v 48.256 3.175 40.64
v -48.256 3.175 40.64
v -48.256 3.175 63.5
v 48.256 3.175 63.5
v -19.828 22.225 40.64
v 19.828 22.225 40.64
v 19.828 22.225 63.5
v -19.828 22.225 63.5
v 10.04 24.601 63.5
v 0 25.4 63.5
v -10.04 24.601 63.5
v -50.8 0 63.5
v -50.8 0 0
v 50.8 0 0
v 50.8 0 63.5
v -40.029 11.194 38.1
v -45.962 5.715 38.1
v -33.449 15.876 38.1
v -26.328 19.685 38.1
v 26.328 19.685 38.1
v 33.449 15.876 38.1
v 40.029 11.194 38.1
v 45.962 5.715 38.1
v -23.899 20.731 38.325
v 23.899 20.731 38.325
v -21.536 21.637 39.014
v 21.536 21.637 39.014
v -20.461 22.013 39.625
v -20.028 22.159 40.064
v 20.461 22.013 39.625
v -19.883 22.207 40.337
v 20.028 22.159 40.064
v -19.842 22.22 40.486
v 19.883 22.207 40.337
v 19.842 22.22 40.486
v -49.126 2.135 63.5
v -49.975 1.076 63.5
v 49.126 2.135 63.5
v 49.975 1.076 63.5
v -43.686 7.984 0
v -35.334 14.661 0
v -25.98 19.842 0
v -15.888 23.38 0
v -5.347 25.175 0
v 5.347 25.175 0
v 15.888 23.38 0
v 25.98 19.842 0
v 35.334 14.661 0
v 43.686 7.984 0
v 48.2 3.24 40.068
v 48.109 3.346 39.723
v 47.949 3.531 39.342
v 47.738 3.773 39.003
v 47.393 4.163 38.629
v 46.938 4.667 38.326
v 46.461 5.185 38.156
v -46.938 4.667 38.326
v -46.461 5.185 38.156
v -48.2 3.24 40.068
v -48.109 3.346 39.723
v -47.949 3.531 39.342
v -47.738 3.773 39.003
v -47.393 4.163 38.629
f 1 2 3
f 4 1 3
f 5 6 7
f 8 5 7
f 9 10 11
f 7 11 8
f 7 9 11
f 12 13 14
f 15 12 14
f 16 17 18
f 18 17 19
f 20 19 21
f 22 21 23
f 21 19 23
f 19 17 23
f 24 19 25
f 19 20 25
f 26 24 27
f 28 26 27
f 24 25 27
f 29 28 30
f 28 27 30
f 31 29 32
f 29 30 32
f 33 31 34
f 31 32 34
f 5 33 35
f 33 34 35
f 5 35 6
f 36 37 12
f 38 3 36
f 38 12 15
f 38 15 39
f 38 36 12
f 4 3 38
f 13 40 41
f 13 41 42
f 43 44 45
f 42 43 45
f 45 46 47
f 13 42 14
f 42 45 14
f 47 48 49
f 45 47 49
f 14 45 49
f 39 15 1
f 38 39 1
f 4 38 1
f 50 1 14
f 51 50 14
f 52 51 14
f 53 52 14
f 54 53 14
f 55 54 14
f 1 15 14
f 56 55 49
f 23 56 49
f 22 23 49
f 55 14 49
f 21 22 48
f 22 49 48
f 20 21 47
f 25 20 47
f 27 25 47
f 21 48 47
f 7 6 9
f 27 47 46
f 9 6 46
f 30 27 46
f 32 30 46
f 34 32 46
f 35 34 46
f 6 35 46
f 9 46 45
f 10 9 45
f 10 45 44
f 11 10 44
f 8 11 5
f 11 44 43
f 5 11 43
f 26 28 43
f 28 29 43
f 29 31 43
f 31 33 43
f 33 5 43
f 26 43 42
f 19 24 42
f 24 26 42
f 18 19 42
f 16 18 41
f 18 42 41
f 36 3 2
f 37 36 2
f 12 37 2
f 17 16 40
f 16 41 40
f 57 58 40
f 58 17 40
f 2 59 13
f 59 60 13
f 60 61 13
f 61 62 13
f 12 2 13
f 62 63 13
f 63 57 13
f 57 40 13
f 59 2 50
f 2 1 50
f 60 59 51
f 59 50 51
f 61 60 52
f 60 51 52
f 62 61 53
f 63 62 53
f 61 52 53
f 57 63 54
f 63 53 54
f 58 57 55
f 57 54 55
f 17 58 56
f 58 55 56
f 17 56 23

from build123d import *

# Parameters (mm, degrees)
F1_DEPTH = 63.5
F2_W     = 19.05
F2_H     = 25.4
F3_DEPTH = 50.8
F4_R     = 2.54


with BuildPart() as f1:
    # F0 (on Top) → F1 (new body)
    with BuildSketch(Plane.XY):
        with BuildLine():
            Line((-50.8, 0), (50.8, 0))
            ThreePointArc((50.8, 0), (0, 25.4), (-50.8, 0))
        make_face()
    extrude(amount=F1_DEPTH)

    # F2 (on Right) → F3 (cut, symmetric)
    with BuildSketch(Plane.YZ):
        with Locations((12.7, 50.8)):
            Rectangle(F2_W, F2_H)
    extrude(amount=F3_DEPTH, both=True, mode=Mode.SUBTRACT)

    # F4
    f4_edges = [f1.edges().sort_by_distance(p)[0] for p in [
        (0, 3.175, 38.1),
        (0, 22.225, 38.1),
    ]]
    fillet(f4_edges, radius=F4_R)


solid = f1.part
